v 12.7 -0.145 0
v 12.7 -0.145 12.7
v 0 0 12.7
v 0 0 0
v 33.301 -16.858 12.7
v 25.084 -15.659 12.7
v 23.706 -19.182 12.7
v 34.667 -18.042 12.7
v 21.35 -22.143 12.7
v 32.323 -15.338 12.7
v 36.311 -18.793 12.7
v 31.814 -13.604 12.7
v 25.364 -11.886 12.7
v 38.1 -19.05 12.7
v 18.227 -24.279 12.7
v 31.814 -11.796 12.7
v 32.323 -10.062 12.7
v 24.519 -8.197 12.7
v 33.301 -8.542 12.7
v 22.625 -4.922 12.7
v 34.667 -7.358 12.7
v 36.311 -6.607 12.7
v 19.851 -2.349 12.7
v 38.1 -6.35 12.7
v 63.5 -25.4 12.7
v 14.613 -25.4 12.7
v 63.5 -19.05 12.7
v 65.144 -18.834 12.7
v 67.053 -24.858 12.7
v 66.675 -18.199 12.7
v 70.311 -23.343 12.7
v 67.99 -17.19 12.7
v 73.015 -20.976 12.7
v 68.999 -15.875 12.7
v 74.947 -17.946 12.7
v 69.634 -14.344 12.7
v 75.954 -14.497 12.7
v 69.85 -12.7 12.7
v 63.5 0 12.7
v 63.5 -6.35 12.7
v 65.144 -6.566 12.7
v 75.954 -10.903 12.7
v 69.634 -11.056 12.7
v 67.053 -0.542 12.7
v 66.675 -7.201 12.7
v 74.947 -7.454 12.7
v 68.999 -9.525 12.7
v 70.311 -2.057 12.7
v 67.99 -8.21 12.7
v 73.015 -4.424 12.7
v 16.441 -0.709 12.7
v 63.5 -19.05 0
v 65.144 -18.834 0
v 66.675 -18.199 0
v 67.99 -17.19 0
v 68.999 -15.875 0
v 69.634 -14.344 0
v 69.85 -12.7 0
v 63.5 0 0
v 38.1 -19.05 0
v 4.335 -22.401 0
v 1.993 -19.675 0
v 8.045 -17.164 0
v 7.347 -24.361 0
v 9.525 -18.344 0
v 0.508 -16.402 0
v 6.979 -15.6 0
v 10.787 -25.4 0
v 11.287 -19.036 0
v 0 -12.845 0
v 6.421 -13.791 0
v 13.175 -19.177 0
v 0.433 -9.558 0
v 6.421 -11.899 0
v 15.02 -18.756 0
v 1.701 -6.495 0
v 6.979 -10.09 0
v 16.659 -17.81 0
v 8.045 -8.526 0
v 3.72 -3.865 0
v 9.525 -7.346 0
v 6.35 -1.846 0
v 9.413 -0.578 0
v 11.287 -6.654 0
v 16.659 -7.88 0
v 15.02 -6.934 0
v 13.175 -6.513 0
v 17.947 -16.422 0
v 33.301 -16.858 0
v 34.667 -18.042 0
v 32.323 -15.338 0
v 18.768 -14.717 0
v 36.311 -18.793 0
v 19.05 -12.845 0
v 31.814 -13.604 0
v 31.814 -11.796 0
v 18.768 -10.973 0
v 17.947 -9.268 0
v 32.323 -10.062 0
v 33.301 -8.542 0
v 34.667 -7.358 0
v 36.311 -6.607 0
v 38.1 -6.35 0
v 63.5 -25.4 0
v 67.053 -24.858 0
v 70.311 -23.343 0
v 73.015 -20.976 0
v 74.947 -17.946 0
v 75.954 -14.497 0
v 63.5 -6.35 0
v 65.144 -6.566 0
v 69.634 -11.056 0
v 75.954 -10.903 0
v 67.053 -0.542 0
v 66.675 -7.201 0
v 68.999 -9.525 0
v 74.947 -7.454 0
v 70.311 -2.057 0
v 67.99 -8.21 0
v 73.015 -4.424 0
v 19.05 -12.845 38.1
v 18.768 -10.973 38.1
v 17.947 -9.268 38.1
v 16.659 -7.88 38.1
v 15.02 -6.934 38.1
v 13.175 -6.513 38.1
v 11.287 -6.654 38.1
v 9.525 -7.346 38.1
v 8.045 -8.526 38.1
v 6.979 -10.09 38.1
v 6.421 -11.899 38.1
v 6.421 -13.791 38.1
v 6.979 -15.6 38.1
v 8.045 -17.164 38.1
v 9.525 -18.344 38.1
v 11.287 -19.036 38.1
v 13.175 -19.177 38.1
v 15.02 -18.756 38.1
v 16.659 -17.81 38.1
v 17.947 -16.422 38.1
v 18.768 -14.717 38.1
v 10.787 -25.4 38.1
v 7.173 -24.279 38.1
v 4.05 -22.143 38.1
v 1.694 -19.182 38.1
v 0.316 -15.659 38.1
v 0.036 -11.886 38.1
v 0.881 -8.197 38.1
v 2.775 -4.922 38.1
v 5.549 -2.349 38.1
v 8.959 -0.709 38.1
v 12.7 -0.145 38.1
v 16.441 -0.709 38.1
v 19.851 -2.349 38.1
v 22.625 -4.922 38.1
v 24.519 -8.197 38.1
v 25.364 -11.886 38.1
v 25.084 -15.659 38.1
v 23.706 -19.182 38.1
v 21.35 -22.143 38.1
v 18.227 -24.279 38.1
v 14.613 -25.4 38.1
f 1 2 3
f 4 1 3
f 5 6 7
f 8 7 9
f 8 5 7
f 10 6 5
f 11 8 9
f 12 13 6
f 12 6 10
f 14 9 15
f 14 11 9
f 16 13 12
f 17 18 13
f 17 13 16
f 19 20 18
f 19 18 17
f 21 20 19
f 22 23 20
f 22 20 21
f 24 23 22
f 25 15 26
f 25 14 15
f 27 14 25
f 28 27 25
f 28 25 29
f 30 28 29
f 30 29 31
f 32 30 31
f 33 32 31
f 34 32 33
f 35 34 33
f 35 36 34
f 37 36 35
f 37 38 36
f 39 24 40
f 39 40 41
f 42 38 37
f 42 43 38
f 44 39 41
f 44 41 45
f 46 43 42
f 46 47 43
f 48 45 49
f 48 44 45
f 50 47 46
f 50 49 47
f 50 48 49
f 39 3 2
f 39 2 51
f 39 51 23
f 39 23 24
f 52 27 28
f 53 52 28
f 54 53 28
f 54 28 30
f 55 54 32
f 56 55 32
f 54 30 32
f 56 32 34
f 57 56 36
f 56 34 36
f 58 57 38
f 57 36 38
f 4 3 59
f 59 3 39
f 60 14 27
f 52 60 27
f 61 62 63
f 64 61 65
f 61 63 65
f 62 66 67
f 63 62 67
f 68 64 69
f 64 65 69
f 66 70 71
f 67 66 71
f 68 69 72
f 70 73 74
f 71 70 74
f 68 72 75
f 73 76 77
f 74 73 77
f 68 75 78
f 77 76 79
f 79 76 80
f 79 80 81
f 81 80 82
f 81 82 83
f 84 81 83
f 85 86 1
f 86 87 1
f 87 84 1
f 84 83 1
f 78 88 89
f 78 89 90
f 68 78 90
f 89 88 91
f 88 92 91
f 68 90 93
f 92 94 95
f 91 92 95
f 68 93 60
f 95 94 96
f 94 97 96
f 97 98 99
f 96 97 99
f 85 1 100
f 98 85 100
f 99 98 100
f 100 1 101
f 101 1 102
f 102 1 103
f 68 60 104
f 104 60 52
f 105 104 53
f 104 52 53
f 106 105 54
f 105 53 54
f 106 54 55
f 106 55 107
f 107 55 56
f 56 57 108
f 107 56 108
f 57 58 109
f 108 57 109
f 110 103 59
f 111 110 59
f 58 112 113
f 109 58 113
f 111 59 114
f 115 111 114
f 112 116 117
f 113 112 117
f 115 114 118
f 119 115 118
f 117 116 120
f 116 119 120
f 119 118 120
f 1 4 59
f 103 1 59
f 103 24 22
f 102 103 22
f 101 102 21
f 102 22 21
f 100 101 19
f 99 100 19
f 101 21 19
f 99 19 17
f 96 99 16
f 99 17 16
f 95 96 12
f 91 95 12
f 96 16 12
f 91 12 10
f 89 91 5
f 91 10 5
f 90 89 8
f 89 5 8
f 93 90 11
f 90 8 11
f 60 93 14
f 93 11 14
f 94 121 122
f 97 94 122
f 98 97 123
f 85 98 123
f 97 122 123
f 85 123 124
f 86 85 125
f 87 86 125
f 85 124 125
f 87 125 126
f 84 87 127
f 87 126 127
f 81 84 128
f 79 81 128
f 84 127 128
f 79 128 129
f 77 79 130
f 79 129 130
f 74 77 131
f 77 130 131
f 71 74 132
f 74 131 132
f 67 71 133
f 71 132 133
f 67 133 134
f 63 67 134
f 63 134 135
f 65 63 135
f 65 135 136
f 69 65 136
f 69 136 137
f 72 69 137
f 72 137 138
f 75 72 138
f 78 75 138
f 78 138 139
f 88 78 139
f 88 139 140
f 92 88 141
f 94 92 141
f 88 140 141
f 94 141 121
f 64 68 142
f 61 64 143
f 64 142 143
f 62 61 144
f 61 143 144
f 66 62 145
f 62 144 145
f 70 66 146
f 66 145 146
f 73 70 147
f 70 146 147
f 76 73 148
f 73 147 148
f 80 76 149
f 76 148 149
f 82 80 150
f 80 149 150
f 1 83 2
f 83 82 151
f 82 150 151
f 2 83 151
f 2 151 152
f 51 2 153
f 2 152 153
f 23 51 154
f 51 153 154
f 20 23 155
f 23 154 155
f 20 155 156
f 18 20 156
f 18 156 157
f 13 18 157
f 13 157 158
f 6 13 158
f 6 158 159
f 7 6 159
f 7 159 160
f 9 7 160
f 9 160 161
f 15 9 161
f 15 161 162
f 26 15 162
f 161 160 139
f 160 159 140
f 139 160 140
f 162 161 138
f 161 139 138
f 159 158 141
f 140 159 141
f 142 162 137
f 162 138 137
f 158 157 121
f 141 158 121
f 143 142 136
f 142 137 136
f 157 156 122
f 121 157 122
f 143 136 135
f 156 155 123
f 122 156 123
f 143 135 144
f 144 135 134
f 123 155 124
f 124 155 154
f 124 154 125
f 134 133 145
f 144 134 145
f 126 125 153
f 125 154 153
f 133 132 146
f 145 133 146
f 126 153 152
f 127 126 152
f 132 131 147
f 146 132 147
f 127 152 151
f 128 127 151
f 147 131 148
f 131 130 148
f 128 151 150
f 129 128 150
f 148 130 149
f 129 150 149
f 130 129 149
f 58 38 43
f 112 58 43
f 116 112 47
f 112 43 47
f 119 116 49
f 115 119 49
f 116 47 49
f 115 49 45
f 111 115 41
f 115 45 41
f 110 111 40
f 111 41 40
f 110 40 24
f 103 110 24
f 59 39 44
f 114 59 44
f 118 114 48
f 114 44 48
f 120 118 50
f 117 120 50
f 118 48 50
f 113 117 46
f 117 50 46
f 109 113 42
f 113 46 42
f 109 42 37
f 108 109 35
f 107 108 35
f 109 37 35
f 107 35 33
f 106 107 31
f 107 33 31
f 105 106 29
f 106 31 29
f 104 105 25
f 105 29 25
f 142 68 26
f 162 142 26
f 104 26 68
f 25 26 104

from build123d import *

# Parameters (mm, degrees)
F1_DEPTH = 25.4
F3_DEPTH = 25.4
F5_DEPTH = 38.1
F7_DEPTH = 12.7
F8_R     = 6.35
F9_DEPTH = 38.1


with BuildPart() as f1:
    # F0 (on Front) → F1 (new body)
    with BuildSketch(Plane.XZ):
        Polygon((0, 38.1), (0, 0), (76.2, 0), (76.2, 12.7), (25.4, 12.7), (25.4, 38.1), align=None)
    extrude(amount=F1_DEPTH)

    # F2 (on face) → F3 (cut)
    with BuildSketch(Plane.XY.offset(38.1)):
        with BuildLine():
            ThreePointArc((0, -12.8449322656), (12.7, -0.1449322656), (25.4, -12.8449322656))
            Line((25.4, -12.8449322656), (25.4, 0))
            Line((25.4, 0), (0, 0))
            Line((0, 0), (0, -12.8449322656))
        make_face()
        with BuildLine():
            Line((25.4, -25.4), (25.4, -12.8449322656))
            ThreePointArc((25.4, -12.8449322656), (22.3329497214, -21.1211801875), (14.6131843048, -25.4))
            Line((14.6131843048, -25.4), (25.4, -25.4))
        make_face()
    extrude(amount=-F3_DEPTH, mode=Mode.SUBTRACT)

    # F4 (on face) → F5 (cut)
    with BuildSketch(Plane.XY.offset(38.1)):
        with BuildLine():
            ThreePointArc((0, -12.8449322656), (3.7197438789, -3.8646761445), (12.7, -0.1449322656))
            Line((12.7, -0.1449322656), (0, 0))
            Line((0, 0), (0, -12.8449322656))
        make_face()
        with BuildLine():
            ThreePointArc((10.7868156952, -25.4), (3.0670502786, -21.1211801875), (0, -12.8449322656))
            Line((0, -12.8449322656), (0, -25.4))
            Line((0, -25.4), (10.7868156952, -25.4))
        make_face()
    extrude(amount=-F5_DEPTH, mode=Mode.SUBTRACT)

    # F6 (on face) → F7 (cut)
    with BuildSketch(Plane.XY.offset(12.7)):
        with BuildLine():
            ThreePointArc((44.4495865053, -12.7), (42.5897145658, -8.2098719395), (38.0995865053, -6.35))
            ThreePointArc((38.0995865053, -6.35), (31.7495865053, -12.7), (38.0995865053, -19.05))
            ThreePointArc((38.0995865053, -19.05), (42.5897145658, -17.1901280605), (44.4495865053, -12.7))
        make_face()
        with BuildLine():
            ThreePointArc((63.5, -19.05), (57.15, -12.7), (63.5, -6.35))
            Line((63.5, -6.35), (38.0995865053, -6.35))
            ThreePointArc((38.0995865053, -6.35), (42.5897145658, -8.2098719395), (44.4495865053, -12.7))
            ThreePointArc((44.4495865053, -12.7), (42.5897145658, -17.1901280605), (38.0995865053, -19.05))
            Line((38.0995865053, -19.05), (63.5, -19.05))
        make_face()
        with BuildLine():
            ThreePointArc((63.5, -19.05), (67.9901280605, -17.1901280605), (69.85, -12.7))
            ThreePointArc((69.85, -12.7), (67.9901280605, -8.2098719395), (63.5, -6.35))
            ThreePointArc((63.5, -6.35), (57.15, -12.7), (63.5, -19.05))
        make_face()
        with BuildLine():
            ThreePointArc((63.5, 0), (76.0816873659, -12.7), (63.5, -25.4))
            Line((63.5, -25.4), (76.2, -25.4))
            Line((76.2, -25.4), (76.2, 0))
            Line((76.2, 0), (63.5, 0))
        make_face()
    extrude(amount=-F7_DEPTH, mode=Mode.SUBTRACT)

    # F8 (on face) → F9 (cut)
    with BuildSketch(Plane.XY.offset(38.1)):
        with Locations((12.7, -12.8449322656)):
            Circle(F8_R)
    extrude(amount=-F9_DEPTH, mode=Mode.SUBTRACT)


solid = f1.part
